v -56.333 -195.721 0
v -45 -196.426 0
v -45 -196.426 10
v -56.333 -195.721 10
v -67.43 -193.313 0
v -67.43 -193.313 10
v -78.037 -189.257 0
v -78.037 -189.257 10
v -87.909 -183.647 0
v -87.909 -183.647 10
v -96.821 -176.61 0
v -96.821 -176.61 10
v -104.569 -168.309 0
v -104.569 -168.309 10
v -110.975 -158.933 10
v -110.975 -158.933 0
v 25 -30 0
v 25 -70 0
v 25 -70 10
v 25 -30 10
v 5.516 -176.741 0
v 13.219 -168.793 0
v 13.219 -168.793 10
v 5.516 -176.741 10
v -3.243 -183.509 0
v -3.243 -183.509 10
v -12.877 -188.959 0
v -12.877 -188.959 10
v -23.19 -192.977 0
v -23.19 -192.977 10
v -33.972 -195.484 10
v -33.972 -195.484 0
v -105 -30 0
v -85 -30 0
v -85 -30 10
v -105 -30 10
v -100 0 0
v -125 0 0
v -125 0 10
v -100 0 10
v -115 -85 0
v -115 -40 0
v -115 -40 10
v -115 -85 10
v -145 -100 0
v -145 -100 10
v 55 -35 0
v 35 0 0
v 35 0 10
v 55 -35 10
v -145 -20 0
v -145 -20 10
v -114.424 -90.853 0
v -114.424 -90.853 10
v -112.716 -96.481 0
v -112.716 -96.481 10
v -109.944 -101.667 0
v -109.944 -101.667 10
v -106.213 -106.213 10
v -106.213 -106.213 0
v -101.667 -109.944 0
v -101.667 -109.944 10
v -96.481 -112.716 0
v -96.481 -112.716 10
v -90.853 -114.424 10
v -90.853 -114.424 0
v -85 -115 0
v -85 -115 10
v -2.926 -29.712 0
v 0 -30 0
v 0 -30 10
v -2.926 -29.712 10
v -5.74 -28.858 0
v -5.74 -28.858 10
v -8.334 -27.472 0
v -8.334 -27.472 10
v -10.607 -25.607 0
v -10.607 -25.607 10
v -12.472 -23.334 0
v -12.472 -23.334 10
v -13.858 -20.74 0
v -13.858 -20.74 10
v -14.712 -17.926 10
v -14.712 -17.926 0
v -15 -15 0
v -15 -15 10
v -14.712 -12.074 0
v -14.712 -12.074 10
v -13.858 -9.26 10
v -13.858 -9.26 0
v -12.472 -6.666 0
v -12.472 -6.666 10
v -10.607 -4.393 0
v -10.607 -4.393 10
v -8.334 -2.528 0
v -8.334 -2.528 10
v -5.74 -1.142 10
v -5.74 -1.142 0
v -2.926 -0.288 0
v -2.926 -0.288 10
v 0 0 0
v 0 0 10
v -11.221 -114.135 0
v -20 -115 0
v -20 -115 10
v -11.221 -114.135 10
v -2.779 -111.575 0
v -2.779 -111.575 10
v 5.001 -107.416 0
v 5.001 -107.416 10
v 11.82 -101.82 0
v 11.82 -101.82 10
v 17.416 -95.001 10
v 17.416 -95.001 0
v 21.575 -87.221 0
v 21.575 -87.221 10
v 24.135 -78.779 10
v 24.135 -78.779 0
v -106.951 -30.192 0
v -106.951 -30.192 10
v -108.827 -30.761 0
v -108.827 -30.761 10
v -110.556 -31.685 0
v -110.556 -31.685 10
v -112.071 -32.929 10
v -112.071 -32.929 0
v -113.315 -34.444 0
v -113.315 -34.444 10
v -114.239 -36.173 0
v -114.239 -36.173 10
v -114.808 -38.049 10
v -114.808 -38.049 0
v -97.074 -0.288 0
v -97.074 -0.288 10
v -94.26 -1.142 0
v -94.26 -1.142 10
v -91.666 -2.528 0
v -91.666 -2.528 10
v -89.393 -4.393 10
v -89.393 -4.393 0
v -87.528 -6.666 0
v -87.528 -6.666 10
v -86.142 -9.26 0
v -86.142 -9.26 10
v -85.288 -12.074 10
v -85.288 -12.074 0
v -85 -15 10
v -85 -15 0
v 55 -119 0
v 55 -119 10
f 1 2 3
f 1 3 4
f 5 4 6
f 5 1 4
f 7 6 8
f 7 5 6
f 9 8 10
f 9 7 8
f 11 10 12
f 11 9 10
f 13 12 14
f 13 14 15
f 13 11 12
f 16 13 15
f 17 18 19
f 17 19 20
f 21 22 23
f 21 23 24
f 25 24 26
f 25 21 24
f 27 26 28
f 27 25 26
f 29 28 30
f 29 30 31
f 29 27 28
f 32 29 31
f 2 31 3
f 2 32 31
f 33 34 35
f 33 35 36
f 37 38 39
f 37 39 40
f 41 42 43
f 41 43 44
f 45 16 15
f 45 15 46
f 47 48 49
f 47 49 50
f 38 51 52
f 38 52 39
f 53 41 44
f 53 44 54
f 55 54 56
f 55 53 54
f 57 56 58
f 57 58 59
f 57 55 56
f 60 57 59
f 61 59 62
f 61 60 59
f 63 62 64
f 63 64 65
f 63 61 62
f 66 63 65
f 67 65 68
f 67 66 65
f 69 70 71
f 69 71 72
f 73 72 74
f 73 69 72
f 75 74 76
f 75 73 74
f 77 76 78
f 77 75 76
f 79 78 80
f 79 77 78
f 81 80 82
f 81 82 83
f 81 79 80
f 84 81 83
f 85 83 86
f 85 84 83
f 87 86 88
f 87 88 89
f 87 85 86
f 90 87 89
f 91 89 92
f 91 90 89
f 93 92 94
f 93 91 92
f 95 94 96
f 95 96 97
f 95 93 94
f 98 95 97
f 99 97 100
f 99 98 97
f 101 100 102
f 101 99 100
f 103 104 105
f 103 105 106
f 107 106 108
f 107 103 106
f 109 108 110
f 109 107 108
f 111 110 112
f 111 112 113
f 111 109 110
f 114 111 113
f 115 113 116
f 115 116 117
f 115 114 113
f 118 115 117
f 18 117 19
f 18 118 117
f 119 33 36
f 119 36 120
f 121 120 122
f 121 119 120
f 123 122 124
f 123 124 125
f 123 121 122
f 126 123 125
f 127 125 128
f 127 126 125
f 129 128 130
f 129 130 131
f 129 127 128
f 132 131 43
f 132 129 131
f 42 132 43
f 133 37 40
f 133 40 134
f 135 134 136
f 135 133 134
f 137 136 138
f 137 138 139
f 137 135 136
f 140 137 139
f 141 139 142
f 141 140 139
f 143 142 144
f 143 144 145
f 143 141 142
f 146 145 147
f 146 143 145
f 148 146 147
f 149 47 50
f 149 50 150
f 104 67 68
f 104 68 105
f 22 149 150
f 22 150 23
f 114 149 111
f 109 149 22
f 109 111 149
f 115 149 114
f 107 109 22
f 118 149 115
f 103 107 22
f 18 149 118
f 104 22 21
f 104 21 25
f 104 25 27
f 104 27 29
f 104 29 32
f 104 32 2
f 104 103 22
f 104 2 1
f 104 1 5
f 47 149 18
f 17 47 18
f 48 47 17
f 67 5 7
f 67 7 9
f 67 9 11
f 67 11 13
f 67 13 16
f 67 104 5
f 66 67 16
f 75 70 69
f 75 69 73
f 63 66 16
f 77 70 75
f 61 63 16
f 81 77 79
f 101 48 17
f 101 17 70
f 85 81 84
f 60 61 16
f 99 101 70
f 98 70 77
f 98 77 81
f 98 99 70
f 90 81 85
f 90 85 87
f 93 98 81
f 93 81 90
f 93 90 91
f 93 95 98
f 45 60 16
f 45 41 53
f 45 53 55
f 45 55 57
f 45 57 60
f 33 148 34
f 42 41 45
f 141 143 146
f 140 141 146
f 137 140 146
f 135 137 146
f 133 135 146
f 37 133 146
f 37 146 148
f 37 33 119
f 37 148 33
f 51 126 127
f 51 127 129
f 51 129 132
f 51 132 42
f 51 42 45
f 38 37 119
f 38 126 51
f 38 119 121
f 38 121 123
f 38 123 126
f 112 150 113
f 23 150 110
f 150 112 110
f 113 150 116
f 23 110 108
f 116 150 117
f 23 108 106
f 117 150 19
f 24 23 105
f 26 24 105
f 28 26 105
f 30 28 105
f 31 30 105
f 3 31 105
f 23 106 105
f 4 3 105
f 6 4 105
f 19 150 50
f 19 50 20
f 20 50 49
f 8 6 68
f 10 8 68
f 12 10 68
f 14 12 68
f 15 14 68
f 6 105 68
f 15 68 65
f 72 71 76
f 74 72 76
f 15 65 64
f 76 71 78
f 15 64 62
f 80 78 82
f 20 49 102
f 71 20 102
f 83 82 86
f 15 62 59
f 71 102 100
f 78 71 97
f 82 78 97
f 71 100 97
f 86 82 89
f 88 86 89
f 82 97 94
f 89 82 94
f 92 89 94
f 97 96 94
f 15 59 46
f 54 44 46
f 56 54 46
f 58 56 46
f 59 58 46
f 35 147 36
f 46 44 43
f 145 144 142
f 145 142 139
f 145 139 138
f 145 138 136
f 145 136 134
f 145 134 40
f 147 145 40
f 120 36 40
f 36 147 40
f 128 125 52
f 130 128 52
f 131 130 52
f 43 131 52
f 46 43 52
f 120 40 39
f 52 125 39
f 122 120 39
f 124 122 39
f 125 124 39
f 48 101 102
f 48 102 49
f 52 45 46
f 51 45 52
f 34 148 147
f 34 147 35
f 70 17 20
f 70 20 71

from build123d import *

# Parameters (mm, degrees)
BOSS_EXTRUDE1_DEPTH = 10


with BuildPart() as part:
    # Sketch1 → Boss-Extrude1 (new body)
    with BuildSketch(Plane.XY):
        with BuildLine():
            Line((0, 0), (35, 0))
            Line((35, 0), (55, -35))
            Line((55, -35), (55, -119))
            Line((55, -119), (13.21880537, -168.792888803))
            ThreePointArc((13.21880537, -168.792888803), (-12.876965195, -188.95866594), (-45, -196.425823621))
            ThreePointArc((-45, -196.425823621), (-83.079272466, -186.639009954), (-110.975129822, -158.932803869))
            Line((-110.975129822, -158.932803869), (-145, -100))
            Line((-145, -100), (-145, -20))
            Line((-145, -20), (-125, 0))
            Line((-125, 0), (-100, 0))
            ThreePointArc((-100, 0), (-89.393398282, -4.393398282), (-85, -15))
            Line((-85, -15), (-85, -30))
            Line((-85, -30), (-105, -30))
            ThreePointArc((-105, -30), (-112.071067812, -32.928932188), (-115, -40))
            Line((-115, -40), (-115, -85))
            ThreePointArc((-115, -85), (-106.213203436, -106.213203436), (-85, -115))
            Line((-85, -115), (-20, -115))
            ThreePointArc((-20, -115), (11.819805153, -101.819805153), (25, -70))
            Line((25, -70), (25, -30))
            Line((25, -30), (0, -30))
            ThreePointArc((0, -30), (-15, -15), (0, 0))
        make_face()
    extrude(amount=BOSS_EXTRUDE1_DEPTH)


solid = part.part
